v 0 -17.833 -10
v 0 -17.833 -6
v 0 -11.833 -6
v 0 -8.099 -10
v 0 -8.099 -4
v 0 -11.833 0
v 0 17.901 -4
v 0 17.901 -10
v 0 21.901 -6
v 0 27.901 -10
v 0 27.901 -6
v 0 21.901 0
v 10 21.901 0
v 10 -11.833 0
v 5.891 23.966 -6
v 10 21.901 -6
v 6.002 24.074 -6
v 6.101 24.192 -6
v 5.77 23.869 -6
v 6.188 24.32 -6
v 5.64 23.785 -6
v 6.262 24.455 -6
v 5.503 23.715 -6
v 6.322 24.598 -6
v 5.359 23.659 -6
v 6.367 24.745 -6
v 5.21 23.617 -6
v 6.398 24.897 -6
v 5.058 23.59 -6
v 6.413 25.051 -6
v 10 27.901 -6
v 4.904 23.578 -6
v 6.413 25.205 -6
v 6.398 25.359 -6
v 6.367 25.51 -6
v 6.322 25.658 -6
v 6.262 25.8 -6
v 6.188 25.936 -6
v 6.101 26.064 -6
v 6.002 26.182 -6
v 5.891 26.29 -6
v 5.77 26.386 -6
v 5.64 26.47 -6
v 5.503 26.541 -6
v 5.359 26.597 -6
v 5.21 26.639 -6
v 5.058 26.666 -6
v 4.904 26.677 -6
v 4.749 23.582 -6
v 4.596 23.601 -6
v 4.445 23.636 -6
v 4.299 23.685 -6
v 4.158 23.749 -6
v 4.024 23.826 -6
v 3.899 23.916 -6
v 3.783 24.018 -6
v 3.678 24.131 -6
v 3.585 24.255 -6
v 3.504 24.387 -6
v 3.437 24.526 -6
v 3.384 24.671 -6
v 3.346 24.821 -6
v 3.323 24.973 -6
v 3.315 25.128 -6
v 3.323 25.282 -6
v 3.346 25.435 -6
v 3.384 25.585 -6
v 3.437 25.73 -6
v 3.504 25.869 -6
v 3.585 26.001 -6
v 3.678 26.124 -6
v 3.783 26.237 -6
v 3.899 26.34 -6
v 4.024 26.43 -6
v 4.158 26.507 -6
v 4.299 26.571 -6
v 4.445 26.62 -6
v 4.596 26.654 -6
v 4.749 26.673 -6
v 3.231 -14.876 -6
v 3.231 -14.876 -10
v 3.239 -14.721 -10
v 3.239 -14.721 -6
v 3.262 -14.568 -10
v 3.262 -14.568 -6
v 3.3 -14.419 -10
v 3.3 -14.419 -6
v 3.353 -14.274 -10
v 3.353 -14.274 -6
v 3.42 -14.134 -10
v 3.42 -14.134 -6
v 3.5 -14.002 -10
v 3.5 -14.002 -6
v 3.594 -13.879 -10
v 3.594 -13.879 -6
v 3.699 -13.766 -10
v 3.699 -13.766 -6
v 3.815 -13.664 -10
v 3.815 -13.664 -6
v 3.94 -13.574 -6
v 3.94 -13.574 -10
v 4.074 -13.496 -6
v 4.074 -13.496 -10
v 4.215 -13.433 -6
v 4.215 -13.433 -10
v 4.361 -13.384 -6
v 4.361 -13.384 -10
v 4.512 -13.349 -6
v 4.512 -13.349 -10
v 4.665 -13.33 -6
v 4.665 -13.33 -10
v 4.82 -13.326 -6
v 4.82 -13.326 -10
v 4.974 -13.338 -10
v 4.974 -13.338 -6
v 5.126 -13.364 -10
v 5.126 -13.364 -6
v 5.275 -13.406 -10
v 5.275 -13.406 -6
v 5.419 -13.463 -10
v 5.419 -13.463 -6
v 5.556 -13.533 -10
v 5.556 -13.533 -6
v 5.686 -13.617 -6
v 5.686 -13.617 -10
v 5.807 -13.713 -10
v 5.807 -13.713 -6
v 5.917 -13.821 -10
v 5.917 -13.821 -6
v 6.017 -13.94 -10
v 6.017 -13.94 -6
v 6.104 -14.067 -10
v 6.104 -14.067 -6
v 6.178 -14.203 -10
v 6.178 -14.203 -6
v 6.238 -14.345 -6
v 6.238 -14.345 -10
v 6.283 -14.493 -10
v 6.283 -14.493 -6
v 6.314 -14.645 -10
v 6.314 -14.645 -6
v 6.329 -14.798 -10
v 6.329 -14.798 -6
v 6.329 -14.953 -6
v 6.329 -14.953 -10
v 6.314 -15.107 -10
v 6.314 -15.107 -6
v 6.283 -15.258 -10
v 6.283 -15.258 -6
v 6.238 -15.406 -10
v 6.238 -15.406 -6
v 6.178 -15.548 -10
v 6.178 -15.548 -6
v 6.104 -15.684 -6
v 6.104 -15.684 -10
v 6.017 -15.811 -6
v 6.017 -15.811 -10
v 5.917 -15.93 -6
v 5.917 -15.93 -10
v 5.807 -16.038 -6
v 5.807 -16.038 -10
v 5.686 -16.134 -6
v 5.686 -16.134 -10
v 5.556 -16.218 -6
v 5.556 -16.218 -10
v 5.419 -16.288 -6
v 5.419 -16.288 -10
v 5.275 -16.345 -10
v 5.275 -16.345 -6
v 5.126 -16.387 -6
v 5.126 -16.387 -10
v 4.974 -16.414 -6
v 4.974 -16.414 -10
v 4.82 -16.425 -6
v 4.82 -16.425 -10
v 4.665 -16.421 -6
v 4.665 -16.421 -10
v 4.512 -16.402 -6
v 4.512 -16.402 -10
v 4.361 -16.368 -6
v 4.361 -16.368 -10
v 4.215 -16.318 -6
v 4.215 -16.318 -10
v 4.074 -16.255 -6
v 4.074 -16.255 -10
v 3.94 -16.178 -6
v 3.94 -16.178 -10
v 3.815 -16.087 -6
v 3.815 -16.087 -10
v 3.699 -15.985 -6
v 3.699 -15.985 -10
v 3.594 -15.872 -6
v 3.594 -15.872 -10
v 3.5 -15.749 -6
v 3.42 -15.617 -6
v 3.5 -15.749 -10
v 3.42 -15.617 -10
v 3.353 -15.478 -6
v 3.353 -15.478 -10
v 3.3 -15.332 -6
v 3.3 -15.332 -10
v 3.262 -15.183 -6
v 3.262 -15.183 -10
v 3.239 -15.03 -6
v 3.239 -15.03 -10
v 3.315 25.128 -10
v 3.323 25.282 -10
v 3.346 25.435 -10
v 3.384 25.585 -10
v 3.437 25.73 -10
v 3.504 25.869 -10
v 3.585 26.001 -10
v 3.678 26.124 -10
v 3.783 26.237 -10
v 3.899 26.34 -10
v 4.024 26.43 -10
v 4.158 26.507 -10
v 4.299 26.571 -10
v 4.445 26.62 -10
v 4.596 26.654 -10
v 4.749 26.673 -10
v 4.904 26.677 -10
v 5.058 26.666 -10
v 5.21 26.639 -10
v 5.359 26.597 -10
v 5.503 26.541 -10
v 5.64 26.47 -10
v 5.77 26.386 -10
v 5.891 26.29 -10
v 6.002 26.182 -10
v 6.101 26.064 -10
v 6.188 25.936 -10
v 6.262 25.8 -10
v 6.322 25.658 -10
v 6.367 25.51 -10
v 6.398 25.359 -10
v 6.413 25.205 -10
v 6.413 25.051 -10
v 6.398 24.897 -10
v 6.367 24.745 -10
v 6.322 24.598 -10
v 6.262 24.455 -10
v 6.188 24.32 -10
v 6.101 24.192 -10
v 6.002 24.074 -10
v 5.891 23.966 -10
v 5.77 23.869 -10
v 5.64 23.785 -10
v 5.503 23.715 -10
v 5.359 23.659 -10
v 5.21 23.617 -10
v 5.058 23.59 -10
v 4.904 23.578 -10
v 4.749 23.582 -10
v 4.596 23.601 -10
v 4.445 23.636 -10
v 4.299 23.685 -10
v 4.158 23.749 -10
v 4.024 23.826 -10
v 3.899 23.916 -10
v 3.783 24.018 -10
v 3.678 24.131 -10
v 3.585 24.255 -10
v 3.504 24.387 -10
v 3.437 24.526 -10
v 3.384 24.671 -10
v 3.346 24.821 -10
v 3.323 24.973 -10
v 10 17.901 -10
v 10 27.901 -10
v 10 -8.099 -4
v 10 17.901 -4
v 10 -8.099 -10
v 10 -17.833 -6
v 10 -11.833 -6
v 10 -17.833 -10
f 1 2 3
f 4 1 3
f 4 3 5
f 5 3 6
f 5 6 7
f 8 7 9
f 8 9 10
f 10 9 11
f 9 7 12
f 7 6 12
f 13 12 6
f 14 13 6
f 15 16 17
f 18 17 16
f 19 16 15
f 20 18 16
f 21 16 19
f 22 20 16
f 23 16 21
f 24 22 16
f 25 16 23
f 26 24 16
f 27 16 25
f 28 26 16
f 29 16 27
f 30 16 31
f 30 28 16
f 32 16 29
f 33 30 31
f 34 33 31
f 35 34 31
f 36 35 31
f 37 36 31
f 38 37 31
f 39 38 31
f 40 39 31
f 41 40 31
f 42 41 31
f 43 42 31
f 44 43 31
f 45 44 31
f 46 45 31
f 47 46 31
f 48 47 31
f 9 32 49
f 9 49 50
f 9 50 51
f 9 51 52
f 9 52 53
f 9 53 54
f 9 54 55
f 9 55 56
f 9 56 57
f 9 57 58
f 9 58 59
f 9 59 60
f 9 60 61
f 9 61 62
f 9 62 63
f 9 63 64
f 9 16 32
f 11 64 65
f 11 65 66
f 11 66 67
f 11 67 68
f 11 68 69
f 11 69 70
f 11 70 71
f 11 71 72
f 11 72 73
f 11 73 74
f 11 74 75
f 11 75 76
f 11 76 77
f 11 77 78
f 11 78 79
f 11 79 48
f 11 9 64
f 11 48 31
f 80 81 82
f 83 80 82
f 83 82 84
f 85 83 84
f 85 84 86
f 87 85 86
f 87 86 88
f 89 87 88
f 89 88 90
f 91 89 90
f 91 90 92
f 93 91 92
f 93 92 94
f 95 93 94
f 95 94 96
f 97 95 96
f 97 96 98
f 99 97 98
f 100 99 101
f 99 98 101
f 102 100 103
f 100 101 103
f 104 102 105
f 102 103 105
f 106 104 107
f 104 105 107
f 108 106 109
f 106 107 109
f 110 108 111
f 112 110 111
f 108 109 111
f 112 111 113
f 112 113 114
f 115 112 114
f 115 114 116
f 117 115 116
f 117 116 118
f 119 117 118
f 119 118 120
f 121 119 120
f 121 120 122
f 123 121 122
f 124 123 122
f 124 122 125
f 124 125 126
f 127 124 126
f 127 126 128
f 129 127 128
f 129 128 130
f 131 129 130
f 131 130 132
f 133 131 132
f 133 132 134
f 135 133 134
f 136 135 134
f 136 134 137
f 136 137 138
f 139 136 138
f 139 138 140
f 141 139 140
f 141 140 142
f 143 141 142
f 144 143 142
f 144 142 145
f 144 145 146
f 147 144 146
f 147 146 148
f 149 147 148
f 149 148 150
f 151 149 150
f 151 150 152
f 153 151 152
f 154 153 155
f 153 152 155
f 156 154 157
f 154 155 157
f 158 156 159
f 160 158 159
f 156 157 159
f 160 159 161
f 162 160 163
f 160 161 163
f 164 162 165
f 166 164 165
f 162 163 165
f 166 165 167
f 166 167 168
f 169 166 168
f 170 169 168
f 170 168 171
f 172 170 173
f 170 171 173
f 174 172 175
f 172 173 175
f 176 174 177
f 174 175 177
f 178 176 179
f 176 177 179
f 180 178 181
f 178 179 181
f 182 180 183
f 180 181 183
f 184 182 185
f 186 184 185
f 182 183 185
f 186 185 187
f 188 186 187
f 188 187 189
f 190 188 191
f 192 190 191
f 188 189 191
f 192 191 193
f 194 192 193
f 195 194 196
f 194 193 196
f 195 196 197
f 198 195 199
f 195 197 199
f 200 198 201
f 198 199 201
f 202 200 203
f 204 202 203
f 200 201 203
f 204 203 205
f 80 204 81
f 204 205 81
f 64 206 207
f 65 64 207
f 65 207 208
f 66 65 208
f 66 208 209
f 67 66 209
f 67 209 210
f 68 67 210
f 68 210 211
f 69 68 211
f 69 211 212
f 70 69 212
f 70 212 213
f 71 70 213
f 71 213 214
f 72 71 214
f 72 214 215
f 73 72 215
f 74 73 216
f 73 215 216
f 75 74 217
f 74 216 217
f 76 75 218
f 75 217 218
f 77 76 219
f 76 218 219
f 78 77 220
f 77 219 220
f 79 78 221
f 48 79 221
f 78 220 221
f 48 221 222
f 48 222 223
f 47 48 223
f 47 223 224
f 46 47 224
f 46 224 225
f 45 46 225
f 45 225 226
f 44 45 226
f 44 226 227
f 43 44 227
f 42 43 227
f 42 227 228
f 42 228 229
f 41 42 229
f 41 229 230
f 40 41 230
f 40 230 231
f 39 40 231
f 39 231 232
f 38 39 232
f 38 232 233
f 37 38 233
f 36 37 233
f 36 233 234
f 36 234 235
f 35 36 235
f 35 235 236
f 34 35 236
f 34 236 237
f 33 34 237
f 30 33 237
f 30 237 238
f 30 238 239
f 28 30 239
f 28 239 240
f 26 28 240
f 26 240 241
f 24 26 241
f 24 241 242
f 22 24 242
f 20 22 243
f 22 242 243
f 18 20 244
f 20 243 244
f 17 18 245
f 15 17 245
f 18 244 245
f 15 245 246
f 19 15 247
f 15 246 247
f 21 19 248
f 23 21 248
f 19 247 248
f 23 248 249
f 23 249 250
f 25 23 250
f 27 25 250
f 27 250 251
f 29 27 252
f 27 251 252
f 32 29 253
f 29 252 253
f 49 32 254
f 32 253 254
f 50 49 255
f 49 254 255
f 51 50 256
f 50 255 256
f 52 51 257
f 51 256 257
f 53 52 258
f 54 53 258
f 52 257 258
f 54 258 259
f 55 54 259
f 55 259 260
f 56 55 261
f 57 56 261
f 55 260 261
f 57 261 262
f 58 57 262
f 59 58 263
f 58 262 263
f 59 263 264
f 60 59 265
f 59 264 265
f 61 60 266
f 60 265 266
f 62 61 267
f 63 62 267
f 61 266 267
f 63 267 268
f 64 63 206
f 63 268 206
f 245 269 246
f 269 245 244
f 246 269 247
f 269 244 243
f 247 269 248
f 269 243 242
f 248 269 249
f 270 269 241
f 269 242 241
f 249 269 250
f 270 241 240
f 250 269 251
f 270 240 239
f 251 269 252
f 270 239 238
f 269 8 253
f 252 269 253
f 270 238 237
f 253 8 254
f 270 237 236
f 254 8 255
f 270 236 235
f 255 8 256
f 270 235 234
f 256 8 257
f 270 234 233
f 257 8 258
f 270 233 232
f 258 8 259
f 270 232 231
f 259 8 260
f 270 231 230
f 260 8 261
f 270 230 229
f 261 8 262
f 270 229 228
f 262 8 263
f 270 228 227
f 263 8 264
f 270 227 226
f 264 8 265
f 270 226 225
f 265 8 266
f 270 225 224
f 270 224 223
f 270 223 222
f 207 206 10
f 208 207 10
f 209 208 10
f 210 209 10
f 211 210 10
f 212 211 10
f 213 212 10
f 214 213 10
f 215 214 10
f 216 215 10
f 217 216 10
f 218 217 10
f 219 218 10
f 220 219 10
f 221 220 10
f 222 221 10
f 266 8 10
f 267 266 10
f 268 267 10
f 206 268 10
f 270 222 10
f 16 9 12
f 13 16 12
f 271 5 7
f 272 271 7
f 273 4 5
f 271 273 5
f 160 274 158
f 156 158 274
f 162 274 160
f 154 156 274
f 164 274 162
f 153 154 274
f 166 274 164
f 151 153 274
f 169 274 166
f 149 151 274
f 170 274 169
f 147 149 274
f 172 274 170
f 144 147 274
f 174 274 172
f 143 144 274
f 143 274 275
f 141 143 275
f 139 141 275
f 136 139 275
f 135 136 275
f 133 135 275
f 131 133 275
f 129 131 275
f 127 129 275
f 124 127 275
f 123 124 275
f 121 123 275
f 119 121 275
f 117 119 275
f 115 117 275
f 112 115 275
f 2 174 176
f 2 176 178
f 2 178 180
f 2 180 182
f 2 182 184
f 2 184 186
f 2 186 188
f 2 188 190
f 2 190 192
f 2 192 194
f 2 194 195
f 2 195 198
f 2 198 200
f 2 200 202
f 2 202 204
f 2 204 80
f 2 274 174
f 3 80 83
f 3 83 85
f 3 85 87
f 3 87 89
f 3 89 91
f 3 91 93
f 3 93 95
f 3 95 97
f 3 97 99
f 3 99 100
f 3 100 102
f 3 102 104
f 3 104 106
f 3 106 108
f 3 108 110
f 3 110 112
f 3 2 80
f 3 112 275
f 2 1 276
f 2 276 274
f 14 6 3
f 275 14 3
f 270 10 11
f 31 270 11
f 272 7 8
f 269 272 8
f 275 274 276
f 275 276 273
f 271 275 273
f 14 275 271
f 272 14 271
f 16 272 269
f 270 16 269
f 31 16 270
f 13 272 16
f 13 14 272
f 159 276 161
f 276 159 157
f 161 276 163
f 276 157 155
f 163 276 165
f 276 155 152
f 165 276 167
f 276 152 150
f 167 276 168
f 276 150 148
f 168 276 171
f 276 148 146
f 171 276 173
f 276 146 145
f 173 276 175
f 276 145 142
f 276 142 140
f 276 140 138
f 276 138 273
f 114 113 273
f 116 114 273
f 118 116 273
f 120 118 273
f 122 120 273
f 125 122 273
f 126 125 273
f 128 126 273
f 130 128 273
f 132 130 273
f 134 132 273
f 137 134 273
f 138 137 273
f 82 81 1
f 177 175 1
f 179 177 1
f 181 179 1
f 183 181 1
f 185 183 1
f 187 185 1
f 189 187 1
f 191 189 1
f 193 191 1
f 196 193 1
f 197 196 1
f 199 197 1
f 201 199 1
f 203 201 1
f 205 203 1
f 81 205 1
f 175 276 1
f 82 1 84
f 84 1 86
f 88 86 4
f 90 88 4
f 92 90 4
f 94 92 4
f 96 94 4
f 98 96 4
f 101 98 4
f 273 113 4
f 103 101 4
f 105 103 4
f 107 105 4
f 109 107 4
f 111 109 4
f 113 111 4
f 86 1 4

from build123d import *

# Parameters (mm, degrees)
F0_W     = 6
F0_H     = 4
F0_W_2   = 26
F1_DEPTH = 10
F3_D     = 3.1


with BuildPart() as f1:
    # F0 (on Right) → F1 (new body)
    with BuildSketch(Plane.YZ):
        Polygon((-8.098859, -4), (-8.098859, 0), (-11.832699, 0), (-11.832699, -6), (-11.832699, -10), (-8.098859, -10), align=None)
        with Locations((-14.832699, -8)):
            Rectangle(F0_W, F0_H)
        with Locations((4.901141, -2)):
            Rectangle(F0_W_2, F0_H)
        Polygon((21.901141, 0), (17.901141, 0), (17.901141, -4), (17.901141, -10), (21.901141, -10), (21.901141, -6), align=None)
        with Locations((24.901141, -8)):
            Rectangle(F0_W, F0_H)
    extrude(amount=F1_DEPTH)

    # F3 (through all)
    with Locations(Plane.XY):
        with Locations((4.781065, -14.87558), (4.865282, 25.127819)):
            Hole(F3_D / 2)


solid = f1.part
